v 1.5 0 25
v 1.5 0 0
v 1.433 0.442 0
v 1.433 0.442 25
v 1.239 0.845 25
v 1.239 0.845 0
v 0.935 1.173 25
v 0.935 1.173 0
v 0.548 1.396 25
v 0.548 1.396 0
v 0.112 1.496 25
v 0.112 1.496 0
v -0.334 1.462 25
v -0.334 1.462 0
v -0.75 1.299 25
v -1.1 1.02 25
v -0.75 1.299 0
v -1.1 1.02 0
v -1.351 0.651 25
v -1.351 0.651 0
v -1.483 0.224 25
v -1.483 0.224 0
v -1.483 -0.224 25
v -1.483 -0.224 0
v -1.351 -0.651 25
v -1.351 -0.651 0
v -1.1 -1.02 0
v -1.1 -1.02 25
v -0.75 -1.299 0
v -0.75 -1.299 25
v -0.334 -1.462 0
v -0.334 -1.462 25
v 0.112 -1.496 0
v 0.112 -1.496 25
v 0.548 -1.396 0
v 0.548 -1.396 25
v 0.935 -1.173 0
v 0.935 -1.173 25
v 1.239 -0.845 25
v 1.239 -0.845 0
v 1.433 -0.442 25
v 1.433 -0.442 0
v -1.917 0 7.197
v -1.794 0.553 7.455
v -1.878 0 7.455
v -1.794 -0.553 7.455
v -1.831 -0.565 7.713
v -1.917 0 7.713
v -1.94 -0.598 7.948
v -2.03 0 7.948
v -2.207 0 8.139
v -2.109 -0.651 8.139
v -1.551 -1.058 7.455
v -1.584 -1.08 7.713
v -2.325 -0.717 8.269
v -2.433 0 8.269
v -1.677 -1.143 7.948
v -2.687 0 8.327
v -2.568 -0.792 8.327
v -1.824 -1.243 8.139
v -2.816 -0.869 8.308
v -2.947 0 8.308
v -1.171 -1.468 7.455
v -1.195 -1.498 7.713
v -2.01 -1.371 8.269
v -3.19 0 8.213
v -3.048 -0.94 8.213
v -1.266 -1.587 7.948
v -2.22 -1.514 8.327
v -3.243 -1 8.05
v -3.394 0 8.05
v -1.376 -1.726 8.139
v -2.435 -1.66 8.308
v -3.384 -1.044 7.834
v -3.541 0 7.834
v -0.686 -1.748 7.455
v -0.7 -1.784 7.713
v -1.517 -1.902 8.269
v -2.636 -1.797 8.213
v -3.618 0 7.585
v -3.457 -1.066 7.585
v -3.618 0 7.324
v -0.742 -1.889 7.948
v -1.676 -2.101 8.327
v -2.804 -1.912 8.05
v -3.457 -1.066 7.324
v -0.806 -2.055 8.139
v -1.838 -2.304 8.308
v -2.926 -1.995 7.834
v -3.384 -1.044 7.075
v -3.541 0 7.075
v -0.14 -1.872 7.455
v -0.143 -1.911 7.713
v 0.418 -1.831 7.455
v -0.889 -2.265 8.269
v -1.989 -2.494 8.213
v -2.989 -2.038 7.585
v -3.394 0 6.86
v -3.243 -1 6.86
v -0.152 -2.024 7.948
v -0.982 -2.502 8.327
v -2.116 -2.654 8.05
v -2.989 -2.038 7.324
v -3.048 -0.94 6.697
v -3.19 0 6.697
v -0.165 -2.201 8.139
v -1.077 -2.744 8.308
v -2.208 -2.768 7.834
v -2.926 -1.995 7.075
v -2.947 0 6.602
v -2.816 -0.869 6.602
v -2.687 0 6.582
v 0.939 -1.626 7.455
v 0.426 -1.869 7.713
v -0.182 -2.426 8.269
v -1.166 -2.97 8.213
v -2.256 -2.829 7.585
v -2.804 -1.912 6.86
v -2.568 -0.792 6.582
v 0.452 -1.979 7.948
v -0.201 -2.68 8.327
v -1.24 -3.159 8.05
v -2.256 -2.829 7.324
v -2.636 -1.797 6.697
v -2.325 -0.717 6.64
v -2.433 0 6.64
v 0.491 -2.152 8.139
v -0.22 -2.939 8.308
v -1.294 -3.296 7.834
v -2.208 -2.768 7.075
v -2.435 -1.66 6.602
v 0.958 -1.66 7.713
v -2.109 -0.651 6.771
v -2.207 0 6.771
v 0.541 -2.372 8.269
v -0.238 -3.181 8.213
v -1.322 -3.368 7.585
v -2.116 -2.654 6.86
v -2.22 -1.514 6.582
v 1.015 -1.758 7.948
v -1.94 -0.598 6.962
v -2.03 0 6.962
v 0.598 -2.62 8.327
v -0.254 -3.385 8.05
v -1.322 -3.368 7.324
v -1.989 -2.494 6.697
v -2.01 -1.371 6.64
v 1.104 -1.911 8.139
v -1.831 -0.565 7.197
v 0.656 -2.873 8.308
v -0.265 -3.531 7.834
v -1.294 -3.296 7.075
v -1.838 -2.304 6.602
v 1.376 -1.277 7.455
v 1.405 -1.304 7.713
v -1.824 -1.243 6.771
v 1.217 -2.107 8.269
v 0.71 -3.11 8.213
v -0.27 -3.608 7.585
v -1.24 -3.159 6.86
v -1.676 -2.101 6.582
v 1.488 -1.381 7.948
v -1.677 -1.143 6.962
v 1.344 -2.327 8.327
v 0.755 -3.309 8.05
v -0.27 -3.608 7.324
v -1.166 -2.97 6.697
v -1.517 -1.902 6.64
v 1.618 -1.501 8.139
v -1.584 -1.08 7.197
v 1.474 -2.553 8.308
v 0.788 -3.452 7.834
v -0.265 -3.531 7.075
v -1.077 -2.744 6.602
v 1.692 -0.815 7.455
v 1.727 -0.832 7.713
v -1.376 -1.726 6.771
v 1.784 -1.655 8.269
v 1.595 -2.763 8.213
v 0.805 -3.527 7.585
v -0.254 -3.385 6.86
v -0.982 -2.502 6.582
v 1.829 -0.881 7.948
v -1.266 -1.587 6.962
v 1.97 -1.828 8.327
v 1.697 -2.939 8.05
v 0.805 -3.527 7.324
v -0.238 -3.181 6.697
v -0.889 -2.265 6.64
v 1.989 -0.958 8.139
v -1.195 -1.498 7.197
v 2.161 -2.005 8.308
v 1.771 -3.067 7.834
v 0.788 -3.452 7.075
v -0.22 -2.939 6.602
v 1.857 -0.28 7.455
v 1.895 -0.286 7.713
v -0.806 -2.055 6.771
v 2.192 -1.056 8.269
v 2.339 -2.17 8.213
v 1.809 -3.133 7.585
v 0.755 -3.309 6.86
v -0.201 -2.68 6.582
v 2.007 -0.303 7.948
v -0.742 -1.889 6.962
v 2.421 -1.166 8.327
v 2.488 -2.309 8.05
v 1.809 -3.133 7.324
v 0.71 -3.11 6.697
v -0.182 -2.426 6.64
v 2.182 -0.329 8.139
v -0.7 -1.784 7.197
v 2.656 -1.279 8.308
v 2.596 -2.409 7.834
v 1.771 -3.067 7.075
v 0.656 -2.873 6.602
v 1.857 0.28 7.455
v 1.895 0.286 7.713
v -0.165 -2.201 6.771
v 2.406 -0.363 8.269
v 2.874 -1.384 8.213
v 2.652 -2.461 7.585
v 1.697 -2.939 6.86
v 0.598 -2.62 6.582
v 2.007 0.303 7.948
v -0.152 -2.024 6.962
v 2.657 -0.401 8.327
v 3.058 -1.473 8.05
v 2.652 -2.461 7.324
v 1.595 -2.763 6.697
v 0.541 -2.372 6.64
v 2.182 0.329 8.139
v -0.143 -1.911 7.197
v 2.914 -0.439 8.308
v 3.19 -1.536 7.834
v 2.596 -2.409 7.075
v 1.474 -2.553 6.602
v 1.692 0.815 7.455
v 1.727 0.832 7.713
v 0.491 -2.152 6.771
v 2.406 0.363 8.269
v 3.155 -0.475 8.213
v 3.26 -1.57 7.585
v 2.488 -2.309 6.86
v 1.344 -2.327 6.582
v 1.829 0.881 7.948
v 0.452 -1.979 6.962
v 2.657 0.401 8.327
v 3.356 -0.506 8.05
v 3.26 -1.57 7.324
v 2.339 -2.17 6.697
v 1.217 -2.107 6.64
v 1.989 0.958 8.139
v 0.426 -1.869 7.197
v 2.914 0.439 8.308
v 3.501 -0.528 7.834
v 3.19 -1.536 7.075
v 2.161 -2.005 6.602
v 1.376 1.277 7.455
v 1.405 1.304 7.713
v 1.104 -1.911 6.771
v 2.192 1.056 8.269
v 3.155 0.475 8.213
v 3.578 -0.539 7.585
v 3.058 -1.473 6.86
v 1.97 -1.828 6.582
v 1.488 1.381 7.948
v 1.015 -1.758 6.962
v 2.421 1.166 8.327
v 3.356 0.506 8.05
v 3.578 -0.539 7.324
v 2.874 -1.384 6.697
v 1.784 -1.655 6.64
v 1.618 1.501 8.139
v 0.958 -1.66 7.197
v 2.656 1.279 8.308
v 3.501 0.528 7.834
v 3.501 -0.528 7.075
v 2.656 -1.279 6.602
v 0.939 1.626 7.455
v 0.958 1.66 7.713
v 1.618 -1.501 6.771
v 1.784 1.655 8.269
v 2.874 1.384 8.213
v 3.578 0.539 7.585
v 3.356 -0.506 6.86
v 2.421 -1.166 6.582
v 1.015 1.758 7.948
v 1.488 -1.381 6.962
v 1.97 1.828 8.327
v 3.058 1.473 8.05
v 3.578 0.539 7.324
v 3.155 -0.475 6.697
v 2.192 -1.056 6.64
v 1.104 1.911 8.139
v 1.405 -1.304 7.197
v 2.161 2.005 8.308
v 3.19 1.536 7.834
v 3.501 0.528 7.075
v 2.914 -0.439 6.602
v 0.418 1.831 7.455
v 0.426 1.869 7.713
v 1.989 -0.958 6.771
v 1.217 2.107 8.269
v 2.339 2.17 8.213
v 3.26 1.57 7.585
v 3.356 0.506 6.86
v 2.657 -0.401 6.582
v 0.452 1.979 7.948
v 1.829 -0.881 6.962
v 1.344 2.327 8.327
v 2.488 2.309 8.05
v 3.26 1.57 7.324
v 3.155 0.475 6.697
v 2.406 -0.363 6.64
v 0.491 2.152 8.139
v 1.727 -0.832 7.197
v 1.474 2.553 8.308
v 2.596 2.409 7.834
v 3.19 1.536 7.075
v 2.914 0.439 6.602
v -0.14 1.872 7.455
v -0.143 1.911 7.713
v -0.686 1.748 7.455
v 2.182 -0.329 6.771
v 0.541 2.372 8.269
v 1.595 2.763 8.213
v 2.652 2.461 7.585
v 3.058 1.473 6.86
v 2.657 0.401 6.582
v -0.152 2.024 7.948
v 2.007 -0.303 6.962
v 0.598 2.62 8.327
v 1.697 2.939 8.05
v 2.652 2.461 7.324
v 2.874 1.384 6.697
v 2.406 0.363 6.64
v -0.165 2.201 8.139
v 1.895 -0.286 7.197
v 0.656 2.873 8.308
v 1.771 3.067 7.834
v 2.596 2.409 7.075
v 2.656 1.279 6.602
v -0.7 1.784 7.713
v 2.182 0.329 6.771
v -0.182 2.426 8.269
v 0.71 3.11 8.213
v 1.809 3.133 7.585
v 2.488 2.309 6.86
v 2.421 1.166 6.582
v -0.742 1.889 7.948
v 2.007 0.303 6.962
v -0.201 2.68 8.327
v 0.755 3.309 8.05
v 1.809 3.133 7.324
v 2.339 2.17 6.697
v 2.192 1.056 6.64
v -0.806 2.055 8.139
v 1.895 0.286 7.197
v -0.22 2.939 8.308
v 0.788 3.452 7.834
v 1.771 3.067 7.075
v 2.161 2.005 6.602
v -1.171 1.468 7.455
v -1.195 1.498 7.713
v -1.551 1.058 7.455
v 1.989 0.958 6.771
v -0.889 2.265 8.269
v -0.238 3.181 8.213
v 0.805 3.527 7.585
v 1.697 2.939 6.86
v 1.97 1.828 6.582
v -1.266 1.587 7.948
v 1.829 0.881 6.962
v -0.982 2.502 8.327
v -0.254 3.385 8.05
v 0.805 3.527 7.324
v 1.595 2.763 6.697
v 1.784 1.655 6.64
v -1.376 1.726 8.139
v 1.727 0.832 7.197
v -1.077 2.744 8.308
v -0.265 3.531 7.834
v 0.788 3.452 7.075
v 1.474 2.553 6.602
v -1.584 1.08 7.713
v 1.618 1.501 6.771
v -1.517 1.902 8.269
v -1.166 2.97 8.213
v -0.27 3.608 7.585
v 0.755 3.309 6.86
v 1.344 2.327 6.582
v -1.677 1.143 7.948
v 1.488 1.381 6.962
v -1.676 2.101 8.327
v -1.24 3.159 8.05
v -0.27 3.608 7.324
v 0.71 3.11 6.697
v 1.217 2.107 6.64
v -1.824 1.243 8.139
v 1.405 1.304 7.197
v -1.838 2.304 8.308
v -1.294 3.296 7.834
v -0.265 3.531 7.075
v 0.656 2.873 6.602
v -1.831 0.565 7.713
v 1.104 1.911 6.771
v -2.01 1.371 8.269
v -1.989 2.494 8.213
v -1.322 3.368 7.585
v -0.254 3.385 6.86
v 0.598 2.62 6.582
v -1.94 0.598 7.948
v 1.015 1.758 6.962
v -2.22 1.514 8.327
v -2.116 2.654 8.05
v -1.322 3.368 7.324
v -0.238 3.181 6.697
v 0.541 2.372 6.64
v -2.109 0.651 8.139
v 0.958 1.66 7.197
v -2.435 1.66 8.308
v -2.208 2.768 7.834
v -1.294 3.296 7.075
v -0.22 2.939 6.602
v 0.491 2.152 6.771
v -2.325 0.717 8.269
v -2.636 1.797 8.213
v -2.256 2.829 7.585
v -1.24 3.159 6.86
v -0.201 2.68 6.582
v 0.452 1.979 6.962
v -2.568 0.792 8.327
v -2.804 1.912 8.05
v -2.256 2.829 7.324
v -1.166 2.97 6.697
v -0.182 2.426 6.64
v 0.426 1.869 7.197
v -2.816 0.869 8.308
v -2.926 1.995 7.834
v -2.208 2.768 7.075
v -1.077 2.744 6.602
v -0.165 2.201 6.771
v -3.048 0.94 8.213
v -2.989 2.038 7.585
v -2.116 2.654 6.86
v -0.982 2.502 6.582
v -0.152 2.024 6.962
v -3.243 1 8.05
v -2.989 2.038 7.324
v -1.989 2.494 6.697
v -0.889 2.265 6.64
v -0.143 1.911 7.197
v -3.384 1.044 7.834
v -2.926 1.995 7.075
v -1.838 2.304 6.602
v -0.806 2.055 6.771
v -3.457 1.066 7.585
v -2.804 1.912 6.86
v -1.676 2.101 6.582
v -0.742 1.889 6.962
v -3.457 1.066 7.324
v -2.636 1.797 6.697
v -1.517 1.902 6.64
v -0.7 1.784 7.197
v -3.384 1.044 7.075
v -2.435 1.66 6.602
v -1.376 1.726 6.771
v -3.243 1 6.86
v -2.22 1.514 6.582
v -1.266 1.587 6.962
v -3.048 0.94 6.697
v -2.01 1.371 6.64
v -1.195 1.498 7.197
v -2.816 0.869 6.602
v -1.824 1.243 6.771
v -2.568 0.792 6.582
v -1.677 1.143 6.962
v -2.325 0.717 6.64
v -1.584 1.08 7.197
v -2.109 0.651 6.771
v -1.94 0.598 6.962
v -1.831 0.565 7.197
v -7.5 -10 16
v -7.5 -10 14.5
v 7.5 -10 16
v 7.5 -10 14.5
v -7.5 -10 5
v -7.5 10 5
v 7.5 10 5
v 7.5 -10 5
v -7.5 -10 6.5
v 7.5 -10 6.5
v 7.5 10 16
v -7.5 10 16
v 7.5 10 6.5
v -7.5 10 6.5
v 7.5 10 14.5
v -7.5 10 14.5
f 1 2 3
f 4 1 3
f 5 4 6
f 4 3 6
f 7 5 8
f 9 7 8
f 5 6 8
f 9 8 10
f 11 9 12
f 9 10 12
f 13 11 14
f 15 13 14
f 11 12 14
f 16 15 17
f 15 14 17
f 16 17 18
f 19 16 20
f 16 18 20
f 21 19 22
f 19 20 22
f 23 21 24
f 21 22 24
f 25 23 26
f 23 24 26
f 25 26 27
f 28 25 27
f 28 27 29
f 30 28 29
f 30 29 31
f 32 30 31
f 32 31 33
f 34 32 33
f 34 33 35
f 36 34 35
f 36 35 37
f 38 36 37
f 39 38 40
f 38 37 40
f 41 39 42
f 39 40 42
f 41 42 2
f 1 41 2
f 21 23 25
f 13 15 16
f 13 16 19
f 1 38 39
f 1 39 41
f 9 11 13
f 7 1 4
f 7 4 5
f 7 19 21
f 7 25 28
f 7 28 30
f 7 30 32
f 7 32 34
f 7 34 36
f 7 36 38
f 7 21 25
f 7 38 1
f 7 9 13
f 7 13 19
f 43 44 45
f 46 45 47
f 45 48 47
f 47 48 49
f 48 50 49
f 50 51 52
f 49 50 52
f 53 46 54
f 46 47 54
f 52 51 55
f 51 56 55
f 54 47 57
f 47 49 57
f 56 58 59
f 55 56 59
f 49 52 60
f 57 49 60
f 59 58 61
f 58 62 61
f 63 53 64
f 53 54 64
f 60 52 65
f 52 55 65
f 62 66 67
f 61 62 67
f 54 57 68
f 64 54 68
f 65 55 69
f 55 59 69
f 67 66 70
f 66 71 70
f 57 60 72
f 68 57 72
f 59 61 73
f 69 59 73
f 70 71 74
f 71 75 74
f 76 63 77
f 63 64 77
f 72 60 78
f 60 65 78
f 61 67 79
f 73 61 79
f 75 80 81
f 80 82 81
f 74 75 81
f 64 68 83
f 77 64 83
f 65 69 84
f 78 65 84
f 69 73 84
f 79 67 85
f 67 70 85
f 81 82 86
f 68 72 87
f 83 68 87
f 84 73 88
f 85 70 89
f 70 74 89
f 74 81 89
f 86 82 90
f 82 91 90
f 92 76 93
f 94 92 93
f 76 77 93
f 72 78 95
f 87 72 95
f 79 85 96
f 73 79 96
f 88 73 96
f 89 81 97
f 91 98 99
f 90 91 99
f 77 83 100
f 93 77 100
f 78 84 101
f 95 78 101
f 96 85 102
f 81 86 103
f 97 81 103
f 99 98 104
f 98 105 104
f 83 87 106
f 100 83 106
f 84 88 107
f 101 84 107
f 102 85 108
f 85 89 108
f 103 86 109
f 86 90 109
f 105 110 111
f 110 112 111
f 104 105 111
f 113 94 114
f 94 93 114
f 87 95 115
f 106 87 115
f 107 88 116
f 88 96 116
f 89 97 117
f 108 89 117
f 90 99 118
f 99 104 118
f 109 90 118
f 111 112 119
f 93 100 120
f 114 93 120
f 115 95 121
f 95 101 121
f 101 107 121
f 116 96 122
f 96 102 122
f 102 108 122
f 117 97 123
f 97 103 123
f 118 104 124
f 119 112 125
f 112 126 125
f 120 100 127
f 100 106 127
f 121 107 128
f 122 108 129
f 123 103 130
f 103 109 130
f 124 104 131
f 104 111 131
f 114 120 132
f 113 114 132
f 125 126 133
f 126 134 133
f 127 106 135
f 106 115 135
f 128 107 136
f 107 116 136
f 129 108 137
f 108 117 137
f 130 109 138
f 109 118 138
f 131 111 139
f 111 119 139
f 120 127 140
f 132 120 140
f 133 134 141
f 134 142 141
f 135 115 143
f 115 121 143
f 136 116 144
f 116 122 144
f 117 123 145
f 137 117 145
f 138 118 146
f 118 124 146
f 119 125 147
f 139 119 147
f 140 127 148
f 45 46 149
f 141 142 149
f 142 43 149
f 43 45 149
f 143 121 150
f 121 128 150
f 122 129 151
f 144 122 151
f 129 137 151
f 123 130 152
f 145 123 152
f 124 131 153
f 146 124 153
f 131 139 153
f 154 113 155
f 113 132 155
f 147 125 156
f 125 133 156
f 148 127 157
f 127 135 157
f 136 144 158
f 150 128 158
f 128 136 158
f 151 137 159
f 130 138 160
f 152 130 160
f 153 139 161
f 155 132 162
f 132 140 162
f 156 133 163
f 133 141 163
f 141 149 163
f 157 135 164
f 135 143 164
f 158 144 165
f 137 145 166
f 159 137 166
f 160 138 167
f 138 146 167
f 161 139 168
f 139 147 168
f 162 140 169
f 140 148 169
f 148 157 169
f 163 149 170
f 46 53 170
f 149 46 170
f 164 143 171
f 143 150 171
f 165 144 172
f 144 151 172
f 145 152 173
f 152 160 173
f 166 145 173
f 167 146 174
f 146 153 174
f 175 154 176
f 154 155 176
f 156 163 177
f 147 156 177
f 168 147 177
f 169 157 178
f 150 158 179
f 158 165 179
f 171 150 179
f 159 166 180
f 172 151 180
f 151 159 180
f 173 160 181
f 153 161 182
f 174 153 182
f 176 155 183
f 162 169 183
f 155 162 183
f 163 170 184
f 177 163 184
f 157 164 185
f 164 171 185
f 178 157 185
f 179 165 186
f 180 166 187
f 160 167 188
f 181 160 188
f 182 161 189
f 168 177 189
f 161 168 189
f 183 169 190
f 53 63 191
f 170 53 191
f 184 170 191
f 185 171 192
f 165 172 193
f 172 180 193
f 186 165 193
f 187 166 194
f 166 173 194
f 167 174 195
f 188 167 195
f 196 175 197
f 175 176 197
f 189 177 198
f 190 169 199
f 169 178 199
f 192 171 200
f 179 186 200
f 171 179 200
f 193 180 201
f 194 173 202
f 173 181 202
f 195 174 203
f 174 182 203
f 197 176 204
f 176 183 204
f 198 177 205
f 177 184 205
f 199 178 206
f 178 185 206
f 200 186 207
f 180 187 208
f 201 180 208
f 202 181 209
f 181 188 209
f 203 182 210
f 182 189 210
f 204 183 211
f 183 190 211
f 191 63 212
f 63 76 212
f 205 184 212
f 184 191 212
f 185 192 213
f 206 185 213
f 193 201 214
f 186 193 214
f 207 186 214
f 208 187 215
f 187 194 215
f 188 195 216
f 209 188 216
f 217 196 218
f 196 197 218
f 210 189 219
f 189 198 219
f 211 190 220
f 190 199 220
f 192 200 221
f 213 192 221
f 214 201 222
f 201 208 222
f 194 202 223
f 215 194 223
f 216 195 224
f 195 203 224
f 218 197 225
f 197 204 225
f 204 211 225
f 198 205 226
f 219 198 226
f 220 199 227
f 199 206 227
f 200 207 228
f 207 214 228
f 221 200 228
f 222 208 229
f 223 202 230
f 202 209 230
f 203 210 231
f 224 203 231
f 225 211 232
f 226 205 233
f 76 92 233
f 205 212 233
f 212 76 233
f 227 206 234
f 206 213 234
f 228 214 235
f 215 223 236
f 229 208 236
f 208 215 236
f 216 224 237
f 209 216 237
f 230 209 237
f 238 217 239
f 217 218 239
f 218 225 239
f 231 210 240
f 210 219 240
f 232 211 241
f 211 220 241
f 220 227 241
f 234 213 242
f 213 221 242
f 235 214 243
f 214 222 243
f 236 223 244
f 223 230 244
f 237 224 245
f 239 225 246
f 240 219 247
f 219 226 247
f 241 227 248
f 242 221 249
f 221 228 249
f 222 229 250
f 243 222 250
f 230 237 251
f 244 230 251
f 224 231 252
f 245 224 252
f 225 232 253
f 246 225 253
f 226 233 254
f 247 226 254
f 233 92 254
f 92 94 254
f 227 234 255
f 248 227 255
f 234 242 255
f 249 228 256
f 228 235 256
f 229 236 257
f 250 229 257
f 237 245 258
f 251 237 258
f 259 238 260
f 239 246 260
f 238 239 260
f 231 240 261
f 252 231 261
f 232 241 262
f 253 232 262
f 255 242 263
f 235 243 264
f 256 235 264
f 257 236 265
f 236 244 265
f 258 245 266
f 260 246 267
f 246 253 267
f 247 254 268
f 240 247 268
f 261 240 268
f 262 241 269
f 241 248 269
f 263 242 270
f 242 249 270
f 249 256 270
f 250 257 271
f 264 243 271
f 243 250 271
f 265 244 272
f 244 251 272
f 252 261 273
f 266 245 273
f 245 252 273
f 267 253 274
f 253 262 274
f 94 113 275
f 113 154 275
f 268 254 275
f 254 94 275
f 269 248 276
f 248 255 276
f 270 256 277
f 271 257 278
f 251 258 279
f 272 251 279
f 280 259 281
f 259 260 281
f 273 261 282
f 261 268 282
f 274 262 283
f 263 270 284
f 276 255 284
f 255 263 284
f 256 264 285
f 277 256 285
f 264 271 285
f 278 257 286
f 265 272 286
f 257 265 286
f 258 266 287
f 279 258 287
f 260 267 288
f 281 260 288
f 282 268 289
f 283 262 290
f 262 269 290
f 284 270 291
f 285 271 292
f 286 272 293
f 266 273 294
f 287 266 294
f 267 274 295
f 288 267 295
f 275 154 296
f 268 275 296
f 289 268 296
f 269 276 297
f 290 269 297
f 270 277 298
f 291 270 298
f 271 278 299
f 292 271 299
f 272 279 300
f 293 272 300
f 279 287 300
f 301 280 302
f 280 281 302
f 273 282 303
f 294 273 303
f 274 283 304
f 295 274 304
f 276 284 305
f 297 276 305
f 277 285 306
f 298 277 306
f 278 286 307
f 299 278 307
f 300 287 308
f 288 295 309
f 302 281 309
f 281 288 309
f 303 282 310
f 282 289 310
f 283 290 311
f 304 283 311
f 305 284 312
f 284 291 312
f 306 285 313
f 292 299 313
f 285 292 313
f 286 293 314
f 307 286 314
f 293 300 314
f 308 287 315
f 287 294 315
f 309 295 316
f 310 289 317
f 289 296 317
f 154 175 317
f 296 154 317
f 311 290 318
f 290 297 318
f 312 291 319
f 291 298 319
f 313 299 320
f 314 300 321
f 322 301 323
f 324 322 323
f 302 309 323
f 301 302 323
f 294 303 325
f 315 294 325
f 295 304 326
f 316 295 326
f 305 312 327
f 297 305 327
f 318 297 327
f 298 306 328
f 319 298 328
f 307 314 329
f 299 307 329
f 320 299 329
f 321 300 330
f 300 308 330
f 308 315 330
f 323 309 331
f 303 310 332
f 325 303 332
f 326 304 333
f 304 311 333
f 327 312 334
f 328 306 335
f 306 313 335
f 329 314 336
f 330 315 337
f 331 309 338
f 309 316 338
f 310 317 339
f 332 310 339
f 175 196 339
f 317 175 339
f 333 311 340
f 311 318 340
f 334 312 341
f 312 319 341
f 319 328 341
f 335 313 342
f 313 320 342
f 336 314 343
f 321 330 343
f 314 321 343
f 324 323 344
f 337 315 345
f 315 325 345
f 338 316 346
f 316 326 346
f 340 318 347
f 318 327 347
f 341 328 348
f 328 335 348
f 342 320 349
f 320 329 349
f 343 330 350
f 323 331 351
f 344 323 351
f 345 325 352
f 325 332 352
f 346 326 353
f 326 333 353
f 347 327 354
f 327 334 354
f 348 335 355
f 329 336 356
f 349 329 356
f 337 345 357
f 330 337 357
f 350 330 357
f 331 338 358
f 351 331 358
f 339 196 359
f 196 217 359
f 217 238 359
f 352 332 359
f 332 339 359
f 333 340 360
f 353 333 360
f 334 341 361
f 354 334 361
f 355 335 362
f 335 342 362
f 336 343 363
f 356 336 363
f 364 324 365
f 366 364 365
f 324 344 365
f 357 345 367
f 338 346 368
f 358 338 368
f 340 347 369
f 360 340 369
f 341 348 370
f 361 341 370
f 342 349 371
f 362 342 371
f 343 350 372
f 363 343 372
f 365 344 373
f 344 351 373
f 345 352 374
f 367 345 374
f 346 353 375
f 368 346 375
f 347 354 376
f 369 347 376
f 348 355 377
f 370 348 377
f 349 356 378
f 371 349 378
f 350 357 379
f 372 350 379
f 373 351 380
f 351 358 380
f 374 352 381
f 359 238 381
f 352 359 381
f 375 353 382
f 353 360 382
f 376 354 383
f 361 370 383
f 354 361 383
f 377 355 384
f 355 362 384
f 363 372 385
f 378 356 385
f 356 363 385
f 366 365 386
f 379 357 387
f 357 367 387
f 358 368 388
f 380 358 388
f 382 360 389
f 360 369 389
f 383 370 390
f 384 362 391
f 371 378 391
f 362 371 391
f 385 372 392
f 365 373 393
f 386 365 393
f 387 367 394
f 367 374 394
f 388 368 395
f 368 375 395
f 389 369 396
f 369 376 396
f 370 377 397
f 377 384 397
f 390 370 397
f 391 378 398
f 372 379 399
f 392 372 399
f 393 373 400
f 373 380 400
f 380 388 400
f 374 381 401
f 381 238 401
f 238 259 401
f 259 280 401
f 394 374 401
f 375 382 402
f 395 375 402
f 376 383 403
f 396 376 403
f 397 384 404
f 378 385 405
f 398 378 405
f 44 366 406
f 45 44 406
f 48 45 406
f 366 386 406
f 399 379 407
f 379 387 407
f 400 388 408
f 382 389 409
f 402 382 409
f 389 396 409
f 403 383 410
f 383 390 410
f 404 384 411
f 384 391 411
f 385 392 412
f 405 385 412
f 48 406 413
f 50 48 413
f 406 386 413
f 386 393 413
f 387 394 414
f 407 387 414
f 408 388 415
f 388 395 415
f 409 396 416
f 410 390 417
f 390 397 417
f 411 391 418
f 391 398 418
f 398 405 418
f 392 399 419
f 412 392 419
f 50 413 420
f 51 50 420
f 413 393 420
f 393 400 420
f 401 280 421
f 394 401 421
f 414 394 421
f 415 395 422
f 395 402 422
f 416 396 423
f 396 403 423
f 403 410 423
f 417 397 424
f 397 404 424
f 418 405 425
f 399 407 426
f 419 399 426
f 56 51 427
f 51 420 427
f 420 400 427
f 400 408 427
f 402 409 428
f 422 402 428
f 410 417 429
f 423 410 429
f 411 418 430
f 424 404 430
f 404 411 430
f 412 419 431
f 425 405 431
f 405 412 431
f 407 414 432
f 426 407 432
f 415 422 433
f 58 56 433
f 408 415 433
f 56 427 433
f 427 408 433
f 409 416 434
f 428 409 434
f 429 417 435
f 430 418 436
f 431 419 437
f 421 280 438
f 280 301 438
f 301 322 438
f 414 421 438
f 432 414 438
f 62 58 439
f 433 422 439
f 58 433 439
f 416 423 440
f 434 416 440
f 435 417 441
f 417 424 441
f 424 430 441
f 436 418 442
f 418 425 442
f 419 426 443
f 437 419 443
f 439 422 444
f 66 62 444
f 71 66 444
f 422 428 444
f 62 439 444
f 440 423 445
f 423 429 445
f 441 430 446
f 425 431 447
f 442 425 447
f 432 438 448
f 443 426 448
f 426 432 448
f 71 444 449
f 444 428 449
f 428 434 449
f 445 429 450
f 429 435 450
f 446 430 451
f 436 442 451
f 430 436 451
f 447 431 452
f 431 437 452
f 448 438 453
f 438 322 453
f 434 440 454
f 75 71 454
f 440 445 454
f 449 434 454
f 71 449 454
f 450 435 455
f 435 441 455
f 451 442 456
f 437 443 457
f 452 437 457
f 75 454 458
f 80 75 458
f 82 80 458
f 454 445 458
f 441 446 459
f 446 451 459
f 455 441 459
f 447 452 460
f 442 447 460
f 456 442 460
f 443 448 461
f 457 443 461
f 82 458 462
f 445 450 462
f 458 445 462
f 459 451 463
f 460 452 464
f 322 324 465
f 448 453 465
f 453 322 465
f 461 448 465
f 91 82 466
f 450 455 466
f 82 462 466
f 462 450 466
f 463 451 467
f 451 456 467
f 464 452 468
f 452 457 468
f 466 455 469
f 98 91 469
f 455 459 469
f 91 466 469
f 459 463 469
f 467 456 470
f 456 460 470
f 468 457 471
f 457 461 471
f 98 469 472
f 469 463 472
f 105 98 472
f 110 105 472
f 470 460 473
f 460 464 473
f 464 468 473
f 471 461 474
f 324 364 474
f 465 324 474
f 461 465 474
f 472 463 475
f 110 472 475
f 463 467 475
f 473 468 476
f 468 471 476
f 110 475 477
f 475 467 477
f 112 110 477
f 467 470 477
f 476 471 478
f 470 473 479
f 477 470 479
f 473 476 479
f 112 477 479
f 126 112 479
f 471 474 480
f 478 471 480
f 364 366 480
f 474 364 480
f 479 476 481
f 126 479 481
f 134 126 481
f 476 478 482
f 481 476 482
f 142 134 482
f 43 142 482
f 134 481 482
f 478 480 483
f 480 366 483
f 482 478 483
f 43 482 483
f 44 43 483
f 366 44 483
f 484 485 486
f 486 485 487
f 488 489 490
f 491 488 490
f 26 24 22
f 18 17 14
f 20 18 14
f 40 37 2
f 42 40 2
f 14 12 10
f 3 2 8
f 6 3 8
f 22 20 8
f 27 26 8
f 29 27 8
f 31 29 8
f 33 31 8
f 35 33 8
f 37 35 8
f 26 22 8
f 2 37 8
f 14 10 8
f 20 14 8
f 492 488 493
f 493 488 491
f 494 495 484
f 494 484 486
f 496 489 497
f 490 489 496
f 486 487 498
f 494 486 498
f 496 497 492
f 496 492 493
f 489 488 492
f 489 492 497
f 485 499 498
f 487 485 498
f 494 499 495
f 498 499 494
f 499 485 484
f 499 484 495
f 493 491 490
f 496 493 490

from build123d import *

# Parameters (mm, degrees)
F0_R     = 1.5
F1_DEPTH = 25
F3_W     = 15
F3_H     = 20
F4_DEPTH = 1.5
F6_W     = 15
F6_H     = 20
F7_DEPTH = 1.5
F8_R     = 0.875


with BuildPart() as f1:
    # F0 (on Top) → F1 (new body)
    with BuildSketch(Plane.XY):
        Circle(F0_R)
    extrude(amount=F1_DEPTH)


with BuildPart() as f4:
    # F3 (on offset) → F4 (new body)
    with BuildSketch(Plane.XY.offset(5)):
        Rectangle(F3_W, F3_H)
    extrude(amount=F4_DEPTH)


with BuildPart() as f7:
    # F6 (on offset) → F7 (new body)
    with BuildSketch(Plane.XY.offset(14.5)):
        Rectangle(F6_W, F6_H)
    extrude(amount=F7_DEPTH)


with BuildPart() as f9:
    # F8 (on Front) → F9 (revolve)
    with BuildSketch(Plane.XZ):
        with Locations((-2.752687, 7.454792)):
            Circle(F8_R)
    revolve(axis=Axis((0, 0, 11.805554), (0, 0, 1)))


solid = Compound([f1.part, f4.part, f7.part, f9.part])
